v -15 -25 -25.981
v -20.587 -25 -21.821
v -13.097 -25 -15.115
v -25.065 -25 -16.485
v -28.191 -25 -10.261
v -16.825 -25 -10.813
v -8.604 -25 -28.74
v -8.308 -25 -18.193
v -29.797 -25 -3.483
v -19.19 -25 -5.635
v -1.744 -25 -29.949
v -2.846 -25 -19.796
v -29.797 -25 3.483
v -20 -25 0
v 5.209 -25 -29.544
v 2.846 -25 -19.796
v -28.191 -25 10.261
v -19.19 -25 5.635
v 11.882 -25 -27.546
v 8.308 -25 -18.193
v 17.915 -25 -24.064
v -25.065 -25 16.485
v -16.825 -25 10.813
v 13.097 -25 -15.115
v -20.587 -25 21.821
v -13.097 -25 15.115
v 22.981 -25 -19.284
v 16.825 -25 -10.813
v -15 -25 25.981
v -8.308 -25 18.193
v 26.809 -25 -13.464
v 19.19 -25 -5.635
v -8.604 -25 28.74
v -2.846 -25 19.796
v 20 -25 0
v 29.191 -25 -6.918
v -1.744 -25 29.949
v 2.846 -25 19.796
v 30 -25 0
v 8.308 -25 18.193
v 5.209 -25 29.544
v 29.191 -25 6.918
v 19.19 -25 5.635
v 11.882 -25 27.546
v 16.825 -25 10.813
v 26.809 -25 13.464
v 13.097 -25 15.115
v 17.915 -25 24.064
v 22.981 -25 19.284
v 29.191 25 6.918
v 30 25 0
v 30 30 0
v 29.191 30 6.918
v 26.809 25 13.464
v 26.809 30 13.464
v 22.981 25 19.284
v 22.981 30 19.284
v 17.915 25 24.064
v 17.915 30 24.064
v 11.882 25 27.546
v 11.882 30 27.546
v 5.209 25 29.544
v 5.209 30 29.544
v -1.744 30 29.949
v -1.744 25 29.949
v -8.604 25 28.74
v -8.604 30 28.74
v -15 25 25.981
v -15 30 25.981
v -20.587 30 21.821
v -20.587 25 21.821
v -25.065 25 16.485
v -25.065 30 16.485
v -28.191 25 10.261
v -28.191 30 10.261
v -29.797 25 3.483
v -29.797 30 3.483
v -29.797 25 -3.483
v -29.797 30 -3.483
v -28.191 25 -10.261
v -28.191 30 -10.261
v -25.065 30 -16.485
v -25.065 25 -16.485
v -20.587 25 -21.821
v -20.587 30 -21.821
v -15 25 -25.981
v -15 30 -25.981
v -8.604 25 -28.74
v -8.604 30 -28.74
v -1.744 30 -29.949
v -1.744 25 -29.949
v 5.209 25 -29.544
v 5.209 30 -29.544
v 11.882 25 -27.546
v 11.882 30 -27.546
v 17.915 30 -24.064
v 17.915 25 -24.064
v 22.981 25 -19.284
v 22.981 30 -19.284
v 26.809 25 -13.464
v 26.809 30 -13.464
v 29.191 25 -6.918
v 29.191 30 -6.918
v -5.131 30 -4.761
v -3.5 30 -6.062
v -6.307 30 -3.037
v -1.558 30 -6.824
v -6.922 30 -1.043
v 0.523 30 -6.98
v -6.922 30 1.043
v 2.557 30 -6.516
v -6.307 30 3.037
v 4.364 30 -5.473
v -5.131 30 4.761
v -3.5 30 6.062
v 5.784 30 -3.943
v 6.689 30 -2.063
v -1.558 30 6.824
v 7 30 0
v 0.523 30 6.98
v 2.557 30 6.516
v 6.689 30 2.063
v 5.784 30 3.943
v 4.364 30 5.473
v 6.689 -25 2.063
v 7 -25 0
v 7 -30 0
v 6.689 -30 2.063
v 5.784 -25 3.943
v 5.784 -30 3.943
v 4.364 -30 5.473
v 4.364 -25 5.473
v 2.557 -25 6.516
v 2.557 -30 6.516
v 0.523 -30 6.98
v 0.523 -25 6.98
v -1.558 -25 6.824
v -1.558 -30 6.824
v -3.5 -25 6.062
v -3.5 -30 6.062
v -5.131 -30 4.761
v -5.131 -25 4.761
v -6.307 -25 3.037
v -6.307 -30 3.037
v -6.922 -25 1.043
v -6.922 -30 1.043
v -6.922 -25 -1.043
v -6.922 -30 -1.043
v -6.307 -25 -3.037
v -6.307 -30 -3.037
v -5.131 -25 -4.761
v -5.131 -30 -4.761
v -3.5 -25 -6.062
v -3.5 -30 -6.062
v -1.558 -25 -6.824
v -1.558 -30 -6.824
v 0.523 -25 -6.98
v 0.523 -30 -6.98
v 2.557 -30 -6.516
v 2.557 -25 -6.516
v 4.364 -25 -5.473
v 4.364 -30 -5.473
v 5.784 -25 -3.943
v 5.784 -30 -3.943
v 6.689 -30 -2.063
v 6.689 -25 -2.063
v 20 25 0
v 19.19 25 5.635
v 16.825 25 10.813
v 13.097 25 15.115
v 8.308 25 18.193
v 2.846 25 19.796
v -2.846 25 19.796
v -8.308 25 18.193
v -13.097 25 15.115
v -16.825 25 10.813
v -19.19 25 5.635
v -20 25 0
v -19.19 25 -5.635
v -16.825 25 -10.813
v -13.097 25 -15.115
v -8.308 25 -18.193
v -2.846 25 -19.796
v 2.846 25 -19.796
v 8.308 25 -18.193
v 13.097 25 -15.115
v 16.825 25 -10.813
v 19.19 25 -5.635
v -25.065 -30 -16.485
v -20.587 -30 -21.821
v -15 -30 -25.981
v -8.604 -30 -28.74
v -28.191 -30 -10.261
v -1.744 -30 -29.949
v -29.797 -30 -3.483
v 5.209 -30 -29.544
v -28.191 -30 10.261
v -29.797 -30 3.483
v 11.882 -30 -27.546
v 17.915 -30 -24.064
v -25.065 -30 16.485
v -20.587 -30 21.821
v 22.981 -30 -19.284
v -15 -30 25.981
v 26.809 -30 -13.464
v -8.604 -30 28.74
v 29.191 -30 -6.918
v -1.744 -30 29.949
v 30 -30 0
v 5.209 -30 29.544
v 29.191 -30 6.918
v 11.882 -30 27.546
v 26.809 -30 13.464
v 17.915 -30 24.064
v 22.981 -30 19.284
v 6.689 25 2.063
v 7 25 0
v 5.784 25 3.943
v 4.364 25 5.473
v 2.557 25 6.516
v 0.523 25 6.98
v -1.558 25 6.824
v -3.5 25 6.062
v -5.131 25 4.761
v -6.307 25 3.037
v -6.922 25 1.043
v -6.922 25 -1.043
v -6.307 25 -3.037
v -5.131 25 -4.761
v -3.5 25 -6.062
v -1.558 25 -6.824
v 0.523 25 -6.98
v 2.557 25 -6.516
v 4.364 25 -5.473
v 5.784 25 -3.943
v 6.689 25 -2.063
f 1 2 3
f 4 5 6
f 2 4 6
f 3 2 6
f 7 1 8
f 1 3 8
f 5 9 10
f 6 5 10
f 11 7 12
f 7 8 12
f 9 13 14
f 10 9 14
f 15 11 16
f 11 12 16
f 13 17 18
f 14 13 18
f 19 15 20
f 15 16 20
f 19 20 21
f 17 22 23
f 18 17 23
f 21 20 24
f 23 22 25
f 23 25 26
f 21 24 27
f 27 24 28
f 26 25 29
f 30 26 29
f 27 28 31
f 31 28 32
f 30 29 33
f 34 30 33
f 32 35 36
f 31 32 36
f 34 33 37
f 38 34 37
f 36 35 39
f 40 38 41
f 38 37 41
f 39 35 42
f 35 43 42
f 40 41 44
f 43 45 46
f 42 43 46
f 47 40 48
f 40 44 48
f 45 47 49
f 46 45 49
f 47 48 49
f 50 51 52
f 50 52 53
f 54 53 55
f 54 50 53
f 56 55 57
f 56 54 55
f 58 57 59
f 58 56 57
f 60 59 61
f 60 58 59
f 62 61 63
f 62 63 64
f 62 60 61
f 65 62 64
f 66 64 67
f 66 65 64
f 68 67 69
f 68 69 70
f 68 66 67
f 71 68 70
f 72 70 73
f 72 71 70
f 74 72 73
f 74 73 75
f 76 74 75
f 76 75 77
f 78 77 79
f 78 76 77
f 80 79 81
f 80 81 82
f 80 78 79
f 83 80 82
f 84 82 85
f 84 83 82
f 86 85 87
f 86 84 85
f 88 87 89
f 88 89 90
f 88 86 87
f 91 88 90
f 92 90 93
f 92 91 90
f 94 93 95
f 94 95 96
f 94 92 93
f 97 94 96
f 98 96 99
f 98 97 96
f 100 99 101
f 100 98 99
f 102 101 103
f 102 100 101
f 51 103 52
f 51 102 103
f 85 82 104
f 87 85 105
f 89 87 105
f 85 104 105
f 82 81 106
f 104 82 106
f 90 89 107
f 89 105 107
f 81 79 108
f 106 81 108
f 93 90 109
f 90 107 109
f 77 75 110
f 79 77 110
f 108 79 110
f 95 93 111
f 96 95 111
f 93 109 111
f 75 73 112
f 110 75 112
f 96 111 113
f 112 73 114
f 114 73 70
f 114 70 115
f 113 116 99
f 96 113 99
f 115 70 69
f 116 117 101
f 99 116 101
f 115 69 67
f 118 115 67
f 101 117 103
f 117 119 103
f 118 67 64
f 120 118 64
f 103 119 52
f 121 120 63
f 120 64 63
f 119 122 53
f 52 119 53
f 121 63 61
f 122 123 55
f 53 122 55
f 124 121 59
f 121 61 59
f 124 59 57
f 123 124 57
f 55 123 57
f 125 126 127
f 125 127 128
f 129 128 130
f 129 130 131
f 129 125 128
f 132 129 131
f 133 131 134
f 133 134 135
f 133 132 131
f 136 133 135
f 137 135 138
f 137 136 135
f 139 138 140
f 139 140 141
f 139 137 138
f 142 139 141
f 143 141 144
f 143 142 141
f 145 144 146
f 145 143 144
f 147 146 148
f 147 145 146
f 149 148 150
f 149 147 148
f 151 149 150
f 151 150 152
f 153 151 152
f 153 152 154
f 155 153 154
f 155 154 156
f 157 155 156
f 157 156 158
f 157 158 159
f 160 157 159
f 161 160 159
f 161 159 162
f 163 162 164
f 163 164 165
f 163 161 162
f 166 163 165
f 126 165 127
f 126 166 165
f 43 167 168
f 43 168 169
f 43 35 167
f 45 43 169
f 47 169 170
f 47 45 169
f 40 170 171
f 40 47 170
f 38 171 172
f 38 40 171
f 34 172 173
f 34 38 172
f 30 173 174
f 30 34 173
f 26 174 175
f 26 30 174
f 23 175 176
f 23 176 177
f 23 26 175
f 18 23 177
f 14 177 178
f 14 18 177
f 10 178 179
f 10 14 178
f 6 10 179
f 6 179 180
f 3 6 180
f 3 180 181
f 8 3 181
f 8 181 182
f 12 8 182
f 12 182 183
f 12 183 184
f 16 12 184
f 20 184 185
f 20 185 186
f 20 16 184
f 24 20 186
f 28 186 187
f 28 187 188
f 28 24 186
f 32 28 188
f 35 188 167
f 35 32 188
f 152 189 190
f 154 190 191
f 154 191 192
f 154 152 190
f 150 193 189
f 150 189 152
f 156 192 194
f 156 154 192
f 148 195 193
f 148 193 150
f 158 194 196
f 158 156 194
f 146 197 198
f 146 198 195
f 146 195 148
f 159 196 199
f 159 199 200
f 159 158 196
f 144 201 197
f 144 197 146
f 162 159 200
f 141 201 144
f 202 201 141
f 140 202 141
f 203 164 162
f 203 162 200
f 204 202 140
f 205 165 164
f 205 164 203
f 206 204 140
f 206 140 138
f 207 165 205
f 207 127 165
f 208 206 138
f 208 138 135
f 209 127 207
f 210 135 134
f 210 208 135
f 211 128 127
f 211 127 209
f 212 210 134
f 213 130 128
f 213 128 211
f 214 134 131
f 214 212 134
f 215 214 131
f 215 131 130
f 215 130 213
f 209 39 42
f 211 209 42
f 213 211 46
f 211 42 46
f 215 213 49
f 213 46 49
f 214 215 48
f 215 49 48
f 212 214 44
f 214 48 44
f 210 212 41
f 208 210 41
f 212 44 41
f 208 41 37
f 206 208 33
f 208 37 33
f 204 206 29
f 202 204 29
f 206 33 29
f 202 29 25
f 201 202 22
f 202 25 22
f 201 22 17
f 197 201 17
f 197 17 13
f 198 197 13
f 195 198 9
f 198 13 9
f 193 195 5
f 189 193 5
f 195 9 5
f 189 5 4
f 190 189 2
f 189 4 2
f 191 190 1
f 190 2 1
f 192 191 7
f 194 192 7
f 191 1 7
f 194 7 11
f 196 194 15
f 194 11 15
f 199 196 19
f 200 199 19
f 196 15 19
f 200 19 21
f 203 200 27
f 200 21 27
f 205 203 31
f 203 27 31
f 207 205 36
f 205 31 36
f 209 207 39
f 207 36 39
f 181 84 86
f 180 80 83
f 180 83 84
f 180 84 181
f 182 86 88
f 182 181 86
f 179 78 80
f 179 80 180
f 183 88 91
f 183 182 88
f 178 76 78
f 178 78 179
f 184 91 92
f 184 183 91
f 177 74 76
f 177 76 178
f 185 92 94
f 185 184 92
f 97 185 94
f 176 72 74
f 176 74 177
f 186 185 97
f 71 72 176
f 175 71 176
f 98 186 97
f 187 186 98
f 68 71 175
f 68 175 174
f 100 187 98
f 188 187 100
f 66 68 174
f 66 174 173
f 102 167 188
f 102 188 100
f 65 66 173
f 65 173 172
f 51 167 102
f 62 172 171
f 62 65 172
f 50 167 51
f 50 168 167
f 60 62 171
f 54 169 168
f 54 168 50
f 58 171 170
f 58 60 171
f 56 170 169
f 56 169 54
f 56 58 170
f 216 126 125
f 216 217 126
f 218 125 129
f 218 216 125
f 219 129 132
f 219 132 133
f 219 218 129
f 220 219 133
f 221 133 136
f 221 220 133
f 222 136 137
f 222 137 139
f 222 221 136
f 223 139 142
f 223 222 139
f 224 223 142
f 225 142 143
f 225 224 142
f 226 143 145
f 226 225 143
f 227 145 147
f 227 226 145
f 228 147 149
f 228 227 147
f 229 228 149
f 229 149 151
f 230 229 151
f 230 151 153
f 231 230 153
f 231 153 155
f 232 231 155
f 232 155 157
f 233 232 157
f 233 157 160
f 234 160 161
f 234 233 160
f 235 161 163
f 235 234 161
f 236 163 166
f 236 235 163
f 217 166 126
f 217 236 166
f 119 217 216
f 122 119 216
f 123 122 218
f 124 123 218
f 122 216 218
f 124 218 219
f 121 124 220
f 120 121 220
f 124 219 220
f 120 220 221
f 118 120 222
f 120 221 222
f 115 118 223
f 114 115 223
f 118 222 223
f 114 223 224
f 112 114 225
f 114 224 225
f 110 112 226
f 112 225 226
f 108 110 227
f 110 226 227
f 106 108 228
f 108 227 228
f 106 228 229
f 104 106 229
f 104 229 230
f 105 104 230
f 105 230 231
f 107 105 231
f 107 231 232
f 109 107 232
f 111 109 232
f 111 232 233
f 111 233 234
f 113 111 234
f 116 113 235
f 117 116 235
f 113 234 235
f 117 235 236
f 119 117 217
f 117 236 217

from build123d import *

# Parameters (mm, degrees)
F0_R     = 20
F0_R_2   = 7
F1_DEPTH = 25
F2_R     = 30
F2_R_2   = 7
F3_DEPTH = 5


with BuildPart() as f1:
    # F0 (on Front) → F1 (new body, symmetric)
    with BuildSketch(Plane.XZ):
        Circle(F0_R)
        Circle(F0_R_2, mode=Mode.SUBTRACT)
    extrude(amount=F1_DEPTH, both=True)

    # F2 (on face) → F3 (join)
    with BuildSketch(Plane.XZ.offset(25)):
        Circle(F2_R)
        Circle(F2_R_2, mode=Mode.SUBTRACT)
    extrude(amount=F3_DEPTH)

    # F4: F1 across plane


with BuildPart() as f1_1:
    add(f1.part)
    add(f1.part.mirror(Plane.XZ))


solid = f1_1.part
